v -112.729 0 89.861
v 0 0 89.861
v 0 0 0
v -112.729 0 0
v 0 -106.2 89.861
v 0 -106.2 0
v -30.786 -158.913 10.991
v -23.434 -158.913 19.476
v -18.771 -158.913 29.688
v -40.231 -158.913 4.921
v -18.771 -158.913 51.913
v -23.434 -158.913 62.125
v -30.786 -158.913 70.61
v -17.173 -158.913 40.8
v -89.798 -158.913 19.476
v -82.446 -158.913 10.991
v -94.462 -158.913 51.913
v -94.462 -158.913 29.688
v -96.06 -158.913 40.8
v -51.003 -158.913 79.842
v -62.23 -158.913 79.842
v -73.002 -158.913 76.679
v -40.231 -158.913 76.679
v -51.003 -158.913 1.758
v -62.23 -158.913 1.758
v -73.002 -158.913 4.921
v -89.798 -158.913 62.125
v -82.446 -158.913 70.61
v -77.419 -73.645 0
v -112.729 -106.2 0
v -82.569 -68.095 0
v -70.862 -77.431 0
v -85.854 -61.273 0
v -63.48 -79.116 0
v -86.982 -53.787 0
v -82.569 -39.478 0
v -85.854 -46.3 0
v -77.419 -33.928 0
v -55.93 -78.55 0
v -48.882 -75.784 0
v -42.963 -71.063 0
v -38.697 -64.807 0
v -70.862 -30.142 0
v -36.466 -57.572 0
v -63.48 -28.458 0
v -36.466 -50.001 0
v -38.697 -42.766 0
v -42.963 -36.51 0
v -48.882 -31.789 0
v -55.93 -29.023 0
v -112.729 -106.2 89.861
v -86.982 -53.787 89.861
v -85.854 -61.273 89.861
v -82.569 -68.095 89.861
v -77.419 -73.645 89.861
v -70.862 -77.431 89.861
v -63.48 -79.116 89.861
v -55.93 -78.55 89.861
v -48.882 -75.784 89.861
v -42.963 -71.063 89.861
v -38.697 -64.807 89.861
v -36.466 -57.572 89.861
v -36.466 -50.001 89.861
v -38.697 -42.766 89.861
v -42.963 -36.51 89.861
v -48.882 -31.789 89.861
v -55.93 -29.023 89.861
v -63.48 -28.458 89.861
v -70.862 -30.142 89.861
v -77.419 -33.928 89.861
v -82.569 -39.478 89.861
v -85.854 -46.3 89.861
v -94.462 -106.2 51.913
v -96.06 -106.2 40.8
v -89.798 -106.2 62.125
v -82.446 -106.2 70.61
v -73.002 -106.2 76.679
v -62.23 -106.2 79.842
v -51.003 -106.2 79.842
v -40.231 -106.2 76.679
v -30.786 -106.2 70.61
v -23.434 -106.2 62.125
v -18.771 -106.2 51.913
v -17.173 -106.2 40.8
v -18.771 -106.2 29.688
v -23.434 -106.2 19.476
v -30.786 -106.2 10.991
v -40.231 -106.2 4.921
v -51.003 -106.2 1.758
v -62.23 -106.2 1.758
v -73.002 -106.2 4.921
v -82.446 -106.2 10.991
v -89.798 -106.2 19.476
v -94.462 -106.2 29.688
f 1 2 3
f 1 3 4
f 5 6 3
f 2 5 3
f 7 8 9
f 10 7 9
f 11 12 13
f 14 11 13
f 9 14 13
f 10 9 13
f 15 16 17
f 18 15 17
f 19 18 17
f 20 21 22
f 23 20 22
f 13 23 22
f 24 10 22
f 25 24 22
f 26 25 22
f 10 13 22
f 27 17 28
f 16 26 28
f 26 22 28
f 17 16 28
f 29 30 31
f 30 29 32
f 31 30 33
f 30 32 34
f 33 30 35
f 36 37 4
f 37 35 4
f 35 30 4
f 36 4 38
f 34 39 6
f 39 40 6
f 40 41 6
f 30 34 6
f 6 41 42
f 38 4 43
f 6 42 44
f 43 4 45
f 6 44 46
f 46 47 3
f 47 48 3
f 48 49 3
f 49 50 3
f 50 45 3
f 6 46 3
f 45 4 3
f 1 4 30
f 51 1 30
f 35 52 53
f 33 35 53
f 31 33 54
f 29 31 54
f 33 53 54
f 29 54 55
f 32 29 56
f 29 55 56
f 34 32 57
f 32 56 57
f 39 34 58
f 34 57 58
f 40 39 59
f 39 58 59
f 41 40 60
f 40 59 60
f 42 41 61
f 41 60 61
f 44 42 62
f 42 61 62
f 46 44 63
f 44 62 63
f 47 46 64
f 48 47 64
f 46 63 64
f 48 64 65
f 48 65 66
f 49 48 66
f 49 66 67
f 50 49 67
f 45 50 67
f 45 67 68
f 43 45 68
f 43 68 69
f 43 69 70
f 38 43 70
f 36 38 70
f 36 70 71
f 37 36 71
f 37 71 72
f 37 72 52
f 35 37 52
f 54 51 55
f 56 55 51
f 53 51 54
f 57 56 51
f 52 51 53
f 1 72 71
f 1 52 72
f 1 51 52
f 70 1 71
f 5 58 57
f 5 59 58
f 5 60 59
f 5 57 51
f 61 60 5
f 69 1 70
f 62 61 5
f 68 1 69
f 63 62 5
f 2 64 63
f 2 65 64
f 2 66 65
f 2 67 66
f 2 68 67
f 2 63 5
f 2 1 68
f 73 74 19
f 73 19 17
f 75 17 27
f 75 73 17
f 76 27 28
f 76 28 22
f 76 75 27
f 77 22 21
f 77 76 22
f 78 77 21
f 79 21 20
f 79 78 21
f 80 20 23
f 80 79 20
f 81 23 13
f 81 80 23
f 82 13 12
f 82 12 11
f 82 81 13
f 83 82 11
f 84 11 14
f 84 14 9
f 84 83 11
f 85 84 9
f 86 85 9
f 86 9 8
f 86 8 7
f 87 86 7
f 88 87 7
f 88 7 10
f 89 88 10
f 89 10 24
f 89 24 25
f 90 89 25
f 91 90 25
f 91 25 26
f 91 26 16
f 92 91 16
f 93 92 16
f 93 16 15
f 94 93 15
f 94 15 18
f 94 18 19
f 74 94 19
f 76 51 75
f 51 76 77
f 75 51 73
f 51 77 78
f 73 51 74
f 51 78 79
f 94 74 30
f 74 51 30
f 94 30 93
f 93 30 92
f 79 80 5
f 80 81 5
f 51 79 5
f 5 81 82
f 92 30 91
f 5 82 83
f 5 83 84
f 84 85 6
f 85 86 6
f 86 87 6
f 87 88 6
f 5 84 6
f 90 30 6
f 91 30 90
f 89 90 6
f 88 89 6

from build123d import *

# Parameters (mm, degrees)
F2_DEPTH = 89.8609068245
F3_R     = 39.4433228708
F4_DEPTH = 158.9131560177
F6_D     = 50.8


with BuildPart() as f2:
    # F0 (on Top) → F2 (new body)
    with BuildSketch(Plane.XY):
        Polygon((0, -106.1998531222), (0, 0), (-112.7292439342, 0), (-112.7292439342, -106.1998531222), (-56.3646219671, -106.1998531222), (-43.278105557, -106.1998531222), align=None)
    extrude(amount=F2_DEPTH)

    # F3 (on face) → F4 (join)
    with BuildSketch(Plane(origin=(0, 0, 0), x_dir=(-1, 0, 0), z_dir=(0, 1, 0))):
        with Locations((56.6163137555, 40.8002994955)):
            Circle(F3_R)
    extrude(amount=-F4_DEPTH)

    # F6 (through all)
    with Locations(Plane(origin=(0, 0, 0), x_dir=(1, 0, 0), z_dir=(0, 0, -1))):
        with Locations((-61.582095921, 53.7865236402)):
            Hole(F6_D / 2)


solid = f2.part
